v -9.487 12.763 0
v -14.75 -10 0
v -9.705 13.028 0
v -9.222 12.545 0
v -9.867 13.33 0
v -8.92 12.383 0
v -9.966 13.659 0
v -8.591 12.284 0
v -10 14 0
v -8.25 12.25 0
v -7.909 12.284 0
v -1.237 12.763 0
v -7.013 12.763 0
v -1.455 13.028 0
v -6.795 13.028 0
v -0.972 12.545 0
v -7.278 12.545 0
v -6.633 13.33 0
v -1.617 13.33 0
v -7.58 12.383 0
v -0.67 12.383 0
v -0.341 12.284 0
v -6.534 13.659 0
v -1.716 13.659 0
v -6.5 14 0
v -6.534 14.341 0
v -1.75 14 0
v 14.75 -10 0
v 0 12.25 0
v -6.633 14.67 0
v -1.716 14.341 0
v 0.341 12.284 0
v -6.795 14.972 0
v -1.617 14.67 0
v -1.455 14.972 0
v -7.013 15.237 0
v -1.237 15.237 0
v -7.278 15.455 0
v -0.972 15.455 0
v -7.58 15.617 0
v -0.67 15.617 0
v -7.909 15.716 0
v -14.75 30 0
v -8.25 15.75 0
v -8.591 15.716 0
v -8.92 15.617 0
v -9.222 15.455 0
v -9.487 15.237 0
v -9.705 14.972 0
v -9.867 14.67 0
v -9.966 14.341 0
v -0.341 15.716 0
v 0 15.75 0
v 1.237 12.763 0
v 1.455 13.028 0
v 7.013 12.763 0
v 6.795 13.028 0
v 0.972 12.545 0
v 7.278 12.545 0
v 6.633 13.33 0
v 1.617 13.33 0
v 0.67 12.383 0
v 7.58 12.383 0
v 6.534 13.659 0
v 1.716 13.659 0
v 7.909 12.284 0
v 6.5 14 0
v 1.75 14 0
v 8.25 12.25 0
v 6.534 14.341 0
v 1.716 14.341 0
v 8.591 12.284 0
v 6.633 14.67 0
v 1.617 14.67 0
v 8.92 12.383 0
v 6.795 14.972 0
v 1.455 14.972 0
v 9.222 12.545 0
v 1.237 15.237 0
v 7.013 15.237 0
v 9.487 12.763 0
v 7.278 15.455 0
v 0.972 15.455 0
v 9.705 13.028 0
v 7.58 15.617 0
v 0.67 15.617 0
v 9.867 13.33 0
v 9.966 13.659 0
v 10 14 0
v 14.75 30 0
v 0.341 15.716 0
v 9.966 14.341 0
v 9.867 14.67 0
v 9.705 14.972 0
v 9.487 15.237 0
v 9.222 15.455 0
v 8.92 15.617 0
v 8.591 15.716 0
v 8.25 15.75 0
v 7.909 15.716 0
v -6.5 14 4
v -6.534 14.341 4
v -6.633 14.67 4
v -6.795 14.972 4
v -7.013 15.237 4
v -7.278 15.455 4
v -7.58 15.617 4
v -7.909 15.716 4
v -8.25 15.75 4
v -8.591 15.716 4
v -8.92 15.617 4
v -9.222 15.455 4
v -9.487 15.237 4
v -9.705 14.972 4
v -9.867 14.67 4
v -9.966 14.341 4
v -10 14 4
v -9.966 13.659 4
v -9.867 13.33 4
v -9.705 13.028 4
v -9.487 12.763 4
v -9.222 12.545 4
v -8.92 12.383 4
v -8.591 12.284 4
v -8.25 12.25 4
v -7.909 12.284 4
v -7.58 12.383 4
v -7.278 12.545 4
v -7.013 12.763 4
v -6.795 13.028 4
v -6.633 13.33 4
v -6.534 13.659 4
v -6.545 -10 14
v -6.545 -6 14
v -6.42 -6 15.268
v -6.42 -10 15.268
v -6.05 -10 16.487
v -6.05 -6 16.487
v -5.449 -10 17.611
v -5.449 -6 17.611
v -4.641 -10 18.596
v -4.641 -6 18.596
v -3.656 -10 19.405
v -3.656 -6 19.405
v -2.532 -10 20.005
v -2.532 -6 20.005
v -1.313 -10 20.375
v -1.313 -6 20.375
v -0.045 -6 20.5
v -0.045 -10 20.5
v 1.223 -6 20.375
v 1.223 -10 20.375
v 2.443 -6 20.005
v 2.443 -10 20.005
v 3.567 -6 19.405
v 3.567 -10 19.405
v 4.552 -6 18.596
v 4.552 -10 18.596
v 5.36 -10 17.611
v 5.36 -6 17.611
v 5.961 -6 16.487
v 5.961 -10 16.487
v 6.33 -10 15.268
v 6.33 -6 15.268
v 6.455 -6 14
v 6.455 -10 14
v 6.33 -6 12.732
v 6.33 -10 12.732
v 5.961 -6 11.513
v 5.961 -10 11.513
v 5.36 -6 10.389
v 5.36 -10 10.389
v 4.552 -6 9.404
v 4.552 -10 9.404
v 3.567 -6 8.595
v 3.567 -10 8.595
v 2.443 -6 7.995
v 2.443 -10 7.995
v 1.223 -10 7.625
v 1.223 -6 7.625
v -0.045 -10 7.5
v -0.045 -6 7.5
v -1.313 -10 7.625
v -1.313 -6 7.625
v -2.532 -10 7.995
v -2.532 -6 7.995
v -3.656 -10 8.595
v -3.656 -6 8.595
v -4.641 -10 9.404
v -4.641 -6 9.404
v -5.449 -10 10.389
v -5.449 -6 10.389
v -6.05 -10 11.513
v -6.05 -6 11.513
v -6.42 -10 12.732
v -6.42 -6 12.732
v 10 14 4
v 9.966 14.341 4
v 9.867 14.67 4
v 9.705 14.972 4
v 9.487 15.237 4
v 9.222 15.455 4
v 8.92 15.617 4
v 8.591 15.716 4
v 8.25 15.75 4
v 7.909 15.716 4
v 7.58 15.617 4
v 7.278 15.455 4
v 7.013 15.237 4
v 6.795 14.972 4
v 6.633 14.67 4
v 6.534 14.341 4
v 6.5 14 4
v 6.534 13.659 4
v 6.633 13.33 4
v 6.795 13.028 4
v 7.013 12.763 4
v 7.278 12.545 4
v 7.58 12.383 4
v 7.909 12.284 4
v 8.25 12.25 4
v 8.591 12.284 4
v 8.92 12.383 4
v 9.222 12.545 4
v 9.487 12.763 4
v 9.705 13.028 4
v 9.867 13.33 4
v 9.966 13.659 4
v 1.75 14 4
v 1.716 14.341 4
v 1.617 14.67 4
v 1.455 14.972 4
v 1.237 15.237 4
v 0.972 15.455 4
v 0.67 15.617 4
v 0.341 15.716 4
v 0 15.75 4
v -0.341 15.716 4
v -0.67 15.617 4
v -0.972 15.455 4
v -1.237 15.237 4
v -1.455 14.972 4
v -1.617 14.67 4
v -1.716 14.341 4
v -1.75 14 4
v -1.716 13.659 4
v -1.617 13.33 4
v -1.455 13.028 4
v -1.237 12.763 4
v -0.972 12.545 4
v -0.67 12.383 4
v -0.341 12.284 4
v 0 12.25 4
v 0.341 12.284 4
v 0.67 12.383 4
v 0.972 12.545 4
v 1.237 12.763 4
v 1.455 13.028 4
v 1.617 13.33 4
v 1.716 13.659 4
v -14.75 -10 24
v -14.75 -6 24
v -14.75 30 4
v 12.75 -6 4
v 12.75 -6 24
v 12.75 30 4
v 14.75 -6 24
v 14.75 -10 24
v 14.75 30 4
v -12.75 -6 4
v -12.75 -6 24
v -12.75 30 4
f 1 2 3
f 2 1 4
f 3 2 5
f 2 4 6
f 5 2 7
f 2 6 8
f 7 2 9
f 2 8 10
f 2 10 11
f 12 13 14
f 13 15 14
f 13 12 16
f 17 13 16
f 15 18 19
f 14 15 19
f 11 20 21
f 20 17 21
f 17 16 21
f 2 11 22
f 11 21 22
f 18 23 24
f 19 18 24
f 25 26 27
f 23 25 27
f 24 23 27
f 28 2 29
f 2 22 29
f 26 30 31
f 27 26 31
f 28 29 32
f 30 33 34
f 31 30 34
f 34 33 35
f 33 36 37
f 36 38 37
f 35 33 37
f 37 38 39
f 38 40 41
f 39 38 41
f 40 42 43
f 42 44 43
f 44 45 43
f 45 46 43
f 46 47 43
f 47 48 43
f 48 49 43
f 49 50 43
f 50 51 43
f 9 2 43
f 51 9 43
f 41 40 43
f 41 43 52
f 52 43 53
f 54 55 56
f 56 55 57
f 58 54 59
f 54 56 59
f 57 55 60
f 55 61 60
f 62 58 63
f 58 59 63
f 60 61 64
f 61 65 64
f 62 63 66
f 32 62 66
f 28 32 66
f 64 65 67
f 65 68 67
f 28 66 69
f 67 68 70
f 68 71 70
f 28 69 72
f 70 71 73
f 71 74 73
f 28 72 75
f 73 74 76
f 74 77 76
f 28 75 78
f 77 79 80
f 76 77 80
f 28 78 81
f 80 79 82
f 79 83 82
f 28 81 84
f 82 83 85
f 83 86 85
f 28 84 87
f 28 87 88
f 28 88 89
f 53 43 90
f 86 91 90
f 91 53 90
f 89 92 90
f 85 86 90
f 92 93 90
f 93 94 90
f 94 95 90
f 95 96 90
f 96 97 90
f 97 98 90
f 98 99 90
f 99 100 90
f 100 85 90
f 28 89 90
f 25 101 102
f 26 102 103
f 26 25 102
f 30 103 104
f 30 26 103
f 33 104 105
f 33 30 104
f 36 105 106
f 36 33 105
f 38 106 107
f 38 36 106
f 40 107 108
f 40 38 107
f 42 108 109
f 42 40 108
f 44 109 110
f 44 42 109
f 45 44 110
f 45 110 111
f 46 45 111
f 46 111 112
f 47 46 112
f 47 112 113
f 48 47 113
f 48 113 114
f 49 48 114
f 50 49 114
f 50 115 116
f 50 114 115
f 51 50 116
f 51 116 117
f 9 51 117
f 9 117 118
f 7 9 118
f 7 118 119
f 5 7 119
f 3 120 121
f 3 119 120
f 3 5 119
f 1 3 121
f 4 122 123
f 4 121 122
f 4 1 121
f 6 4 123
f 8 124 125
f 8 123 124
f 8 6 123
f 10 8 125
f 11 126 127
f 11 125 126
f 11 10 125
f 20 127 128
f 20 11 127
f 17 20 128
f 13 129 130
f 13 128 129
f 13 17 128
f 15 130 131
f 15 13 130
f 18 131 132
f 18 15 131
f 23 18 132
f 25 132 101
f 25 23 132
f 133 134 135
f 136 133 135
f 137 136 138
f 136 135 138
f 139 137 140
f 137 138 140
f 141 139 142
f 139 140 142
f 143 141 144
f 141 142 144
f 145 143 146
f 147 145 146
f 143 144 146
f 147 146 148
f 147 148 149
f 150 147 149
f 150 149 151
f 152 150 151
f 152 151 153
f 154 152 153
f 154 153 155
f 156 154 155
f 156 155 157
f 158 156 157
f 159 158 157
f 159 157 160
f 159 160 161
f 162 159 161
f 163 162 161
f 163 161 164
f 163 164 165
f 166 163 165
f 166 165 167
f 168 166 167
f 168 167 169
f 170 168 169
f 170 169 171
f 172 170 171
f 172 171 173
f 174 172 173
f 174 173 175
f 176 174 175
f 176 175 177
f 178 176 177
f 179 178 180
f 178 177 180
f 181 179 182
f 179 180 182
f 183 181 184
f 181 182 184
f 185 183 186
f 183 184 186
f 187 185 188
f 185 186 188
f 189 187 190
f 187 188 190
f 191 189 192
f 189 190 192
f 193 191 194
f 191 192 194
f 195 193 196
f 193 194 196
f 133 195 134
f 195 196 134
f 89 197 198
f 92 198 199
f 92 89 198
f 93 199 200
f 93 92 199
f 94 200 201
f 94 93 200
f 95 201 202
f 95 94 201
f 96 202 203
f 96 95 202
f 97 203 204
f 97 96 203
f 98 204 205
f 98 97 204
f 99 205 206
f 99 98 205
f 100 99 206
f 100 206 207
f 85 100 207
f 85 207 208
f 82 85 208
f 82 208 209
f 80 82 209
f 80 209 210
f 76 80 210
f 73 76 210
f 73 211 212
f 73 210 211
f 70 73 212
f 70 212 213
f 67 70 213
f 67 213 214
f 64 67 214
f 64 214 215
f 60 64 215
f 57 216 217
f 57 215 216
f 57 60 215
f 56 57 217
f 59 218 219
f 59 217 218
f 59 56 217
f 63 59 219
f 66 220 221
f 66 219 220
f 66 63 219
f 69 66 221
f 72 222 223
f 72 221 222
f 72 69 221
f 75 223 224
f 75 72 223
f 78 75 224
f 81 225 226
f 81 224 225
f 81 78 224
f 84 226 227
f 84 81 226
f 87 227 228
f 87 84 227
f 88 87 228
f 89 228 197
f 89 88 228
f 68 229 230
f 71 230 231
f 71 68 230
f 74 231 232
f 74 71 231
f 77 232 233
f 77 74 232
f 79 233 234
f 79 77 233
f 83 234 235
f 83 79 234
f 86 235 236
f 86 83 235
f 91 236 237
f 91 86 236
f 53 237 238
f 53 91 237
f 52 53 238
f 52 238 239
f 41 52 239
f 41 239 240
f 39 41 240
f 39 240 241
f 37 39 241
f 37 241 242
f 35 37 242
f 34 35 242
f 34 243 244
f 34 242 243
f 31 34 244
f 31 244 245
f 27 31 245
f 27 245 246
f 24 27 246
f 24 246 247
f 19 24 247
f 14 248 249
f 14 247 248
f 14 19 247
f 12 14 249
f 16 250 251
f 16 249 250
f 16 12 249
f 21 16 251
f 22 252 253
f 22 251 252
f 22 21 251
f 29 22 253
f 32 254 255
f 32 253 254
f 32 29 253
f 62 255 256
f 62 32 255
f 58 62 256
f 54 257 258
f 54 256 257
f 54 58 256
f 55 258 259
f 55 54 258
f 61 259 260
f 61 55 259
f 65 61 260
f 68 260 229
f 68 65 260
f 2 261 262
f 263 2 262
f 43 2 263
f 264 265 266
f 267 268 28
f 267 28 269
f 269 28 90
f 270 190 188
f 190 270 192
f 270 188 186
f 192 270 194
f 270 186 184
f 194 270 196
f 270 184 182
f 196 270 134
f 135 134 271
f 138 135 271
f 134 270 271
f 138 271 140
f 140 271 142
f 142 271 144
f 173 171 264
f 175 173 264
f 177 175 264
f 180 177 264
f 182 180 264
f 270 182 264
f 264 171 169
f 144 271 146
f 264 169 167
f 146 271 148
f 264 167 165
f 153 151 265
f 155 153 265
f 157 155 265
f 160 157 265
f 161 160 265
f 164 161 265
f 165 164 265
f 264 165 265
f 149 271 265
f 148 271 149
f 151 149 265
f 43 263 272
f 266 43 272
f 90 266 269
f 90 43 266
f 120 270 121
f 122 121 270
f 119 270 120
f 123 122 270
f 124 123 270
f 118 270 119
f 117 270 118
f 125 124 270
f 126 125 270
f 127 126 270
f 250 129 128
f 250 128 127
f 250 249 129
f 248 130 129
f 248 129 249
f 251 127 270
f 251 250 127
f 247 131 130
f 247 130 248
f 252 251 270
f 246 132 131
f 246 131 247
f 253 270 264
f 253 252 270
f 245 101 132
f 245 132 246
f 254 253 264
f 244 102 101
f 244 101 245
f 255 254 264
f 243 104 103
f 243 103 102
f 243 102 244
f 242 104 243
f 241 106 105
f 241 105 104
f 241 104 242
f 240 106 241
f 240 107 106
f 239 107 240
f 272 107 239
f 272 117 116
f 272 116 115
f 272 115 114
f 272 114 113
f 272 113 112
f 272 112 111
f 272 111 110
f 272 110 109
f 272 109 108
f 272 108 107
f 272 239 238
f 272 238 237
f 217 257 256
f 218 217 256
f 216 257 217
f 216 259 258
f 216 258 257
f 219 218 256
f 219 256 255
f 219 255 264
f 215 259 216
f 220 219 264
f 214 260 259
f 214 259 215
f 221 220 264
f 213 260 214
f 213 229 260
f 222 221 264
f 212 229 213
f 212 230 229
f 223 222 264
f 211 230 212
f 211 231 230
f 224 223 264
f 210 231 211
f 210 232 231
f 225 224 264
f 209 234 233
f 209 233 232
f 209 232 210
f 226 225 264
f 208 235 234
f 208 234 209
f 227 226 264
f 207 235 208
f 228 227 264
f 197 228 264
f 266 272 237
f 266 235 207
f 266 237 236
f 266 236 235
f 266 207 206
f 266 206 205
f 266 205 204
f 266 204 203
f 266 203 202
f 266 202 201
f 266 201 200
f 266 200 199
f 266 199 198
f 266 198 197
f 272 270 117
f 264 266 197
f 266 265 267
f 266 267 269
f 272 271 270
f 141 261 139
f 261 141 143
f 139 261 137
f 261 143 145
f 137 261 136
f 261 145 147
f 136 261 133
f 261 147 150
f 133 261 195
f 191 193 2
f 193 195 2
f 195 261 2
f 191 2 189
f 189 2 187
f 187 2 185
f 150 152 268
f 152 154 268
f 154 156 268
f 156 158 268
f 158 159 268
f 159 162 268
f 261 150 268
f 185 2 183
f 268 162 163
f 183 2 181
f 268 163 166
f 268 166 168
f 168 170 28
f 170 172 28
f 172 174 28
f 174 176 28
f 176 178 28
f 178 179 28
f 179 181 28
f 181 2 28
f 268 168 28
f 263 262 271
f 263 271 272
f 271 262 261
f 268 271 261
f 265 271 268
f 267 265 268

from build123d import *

# Parameters (mm, degrees)
SKETCH_W        = 29.5
SKETCH_H        = 40
SKETCH_R        = 1.75
PAD_DEPTH       = 24
SKETCH001_W     = 25.5
SKETCH001_H     = 36
POCKET_DEPTH    = 20
POCKET001_DEPTH = 29.501
SKETCH003_R     = 6.5
POCKET002_DEPTH = 5


with BuildPart() as part:
    # Sketch → Pad (new body)
    with BuildSketch(Plane.XY):
        with Locations((0, 10)):
            Rectangle(SKETCH_W, SKETCH_H)
        with Locations((-8.25, 14)):
            Circle(SKETCH_R, mode=Mode.SUBTRACT)
        with Locations((0, 14)):
            Circle(SKETCH_R, mode=Mode.SUBTRACT)
        with Locations((8.25, 14)):
            Circle(SKETCH_R, mode=Mode.SUBTRACT)
    extrude(amount=PAD_DEPTH)

    # Sketch001 (on Face9 of Pad) → Pocket (cut)
    with BuildSketch(Plane.XY.offset(24)):
        with Locations((0, 12)):
            Rectangle(SKETCH001_W, SKETCH001_H)
    extrude(amount=-POCKET_DEPTH, mode=Mode.SUBTRACT)

    # Sketch002 (on Face8 of Pocket) → Pocket001 (cut, through all)
    with BuildSketch(Plane(origin=(-14.75, 0, 0), x_dir=(0, -1, 0), z_dir=(-1, 0, 0))):
        Polygon((-30, 24), (6, 24), (-30, 4), align=None)
    extrude(amount=-POCKET001_DEPTH, mode=Mode.SUBTRACT)

    # Sketch003 (on Face15 of Pocket001) → Pocket002 (cut)
    with BuildSketch(Plane(origin=(0, -6, 0), x_dir=(-1, 0, 0), z_dir=(0, 1, 0))):
        with Locations((0.044684, 14)):
            Circle(SKETCH003_R)
    extrude(amount=-POCKET002_DEPTH, mode=Mode.SUBTRACT)


solid = part.part
